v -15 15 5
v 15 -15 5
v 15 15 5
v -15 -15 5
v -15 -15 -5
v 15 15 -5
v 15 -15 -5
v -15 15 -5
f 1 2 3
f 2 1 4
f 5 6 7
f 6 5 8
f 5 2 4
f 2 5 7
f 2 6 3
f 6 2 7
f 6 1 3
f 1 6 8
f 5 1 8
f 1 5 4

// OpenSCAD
// file: parts/body.scad
// SPDX-License-Identifier: CC-BY-NC-SA-4.0
// body part for __NAME__.
module body() {
    cube([30, 30, 10], center = true);
}

// Render this part alone when opened directly.
body();
// main file
// SPDX-License-Identifier: CC-BY-NC-SA-4.0
// __NAME__ — multipart assembly with tuneable exploded view.
// Render: make render P=__NAME__

// use <fans/fans.scad>;   // import libraries as needed
use <parts/body.scad>;

/* [Exploded View] */
explode = 0; // [0:0.01:1]

/* [Parts] */
show_body = true;

// Each part offsets along its own vector scaled by `explode`
// (0 = assembled, 1 = fully exploded).
module assembly() {
    if (show_body) translate([0, 0, 0] * explode) body();
    // Add parts here, each with its own explode vector and show_<part> bool.
}

assembly();
